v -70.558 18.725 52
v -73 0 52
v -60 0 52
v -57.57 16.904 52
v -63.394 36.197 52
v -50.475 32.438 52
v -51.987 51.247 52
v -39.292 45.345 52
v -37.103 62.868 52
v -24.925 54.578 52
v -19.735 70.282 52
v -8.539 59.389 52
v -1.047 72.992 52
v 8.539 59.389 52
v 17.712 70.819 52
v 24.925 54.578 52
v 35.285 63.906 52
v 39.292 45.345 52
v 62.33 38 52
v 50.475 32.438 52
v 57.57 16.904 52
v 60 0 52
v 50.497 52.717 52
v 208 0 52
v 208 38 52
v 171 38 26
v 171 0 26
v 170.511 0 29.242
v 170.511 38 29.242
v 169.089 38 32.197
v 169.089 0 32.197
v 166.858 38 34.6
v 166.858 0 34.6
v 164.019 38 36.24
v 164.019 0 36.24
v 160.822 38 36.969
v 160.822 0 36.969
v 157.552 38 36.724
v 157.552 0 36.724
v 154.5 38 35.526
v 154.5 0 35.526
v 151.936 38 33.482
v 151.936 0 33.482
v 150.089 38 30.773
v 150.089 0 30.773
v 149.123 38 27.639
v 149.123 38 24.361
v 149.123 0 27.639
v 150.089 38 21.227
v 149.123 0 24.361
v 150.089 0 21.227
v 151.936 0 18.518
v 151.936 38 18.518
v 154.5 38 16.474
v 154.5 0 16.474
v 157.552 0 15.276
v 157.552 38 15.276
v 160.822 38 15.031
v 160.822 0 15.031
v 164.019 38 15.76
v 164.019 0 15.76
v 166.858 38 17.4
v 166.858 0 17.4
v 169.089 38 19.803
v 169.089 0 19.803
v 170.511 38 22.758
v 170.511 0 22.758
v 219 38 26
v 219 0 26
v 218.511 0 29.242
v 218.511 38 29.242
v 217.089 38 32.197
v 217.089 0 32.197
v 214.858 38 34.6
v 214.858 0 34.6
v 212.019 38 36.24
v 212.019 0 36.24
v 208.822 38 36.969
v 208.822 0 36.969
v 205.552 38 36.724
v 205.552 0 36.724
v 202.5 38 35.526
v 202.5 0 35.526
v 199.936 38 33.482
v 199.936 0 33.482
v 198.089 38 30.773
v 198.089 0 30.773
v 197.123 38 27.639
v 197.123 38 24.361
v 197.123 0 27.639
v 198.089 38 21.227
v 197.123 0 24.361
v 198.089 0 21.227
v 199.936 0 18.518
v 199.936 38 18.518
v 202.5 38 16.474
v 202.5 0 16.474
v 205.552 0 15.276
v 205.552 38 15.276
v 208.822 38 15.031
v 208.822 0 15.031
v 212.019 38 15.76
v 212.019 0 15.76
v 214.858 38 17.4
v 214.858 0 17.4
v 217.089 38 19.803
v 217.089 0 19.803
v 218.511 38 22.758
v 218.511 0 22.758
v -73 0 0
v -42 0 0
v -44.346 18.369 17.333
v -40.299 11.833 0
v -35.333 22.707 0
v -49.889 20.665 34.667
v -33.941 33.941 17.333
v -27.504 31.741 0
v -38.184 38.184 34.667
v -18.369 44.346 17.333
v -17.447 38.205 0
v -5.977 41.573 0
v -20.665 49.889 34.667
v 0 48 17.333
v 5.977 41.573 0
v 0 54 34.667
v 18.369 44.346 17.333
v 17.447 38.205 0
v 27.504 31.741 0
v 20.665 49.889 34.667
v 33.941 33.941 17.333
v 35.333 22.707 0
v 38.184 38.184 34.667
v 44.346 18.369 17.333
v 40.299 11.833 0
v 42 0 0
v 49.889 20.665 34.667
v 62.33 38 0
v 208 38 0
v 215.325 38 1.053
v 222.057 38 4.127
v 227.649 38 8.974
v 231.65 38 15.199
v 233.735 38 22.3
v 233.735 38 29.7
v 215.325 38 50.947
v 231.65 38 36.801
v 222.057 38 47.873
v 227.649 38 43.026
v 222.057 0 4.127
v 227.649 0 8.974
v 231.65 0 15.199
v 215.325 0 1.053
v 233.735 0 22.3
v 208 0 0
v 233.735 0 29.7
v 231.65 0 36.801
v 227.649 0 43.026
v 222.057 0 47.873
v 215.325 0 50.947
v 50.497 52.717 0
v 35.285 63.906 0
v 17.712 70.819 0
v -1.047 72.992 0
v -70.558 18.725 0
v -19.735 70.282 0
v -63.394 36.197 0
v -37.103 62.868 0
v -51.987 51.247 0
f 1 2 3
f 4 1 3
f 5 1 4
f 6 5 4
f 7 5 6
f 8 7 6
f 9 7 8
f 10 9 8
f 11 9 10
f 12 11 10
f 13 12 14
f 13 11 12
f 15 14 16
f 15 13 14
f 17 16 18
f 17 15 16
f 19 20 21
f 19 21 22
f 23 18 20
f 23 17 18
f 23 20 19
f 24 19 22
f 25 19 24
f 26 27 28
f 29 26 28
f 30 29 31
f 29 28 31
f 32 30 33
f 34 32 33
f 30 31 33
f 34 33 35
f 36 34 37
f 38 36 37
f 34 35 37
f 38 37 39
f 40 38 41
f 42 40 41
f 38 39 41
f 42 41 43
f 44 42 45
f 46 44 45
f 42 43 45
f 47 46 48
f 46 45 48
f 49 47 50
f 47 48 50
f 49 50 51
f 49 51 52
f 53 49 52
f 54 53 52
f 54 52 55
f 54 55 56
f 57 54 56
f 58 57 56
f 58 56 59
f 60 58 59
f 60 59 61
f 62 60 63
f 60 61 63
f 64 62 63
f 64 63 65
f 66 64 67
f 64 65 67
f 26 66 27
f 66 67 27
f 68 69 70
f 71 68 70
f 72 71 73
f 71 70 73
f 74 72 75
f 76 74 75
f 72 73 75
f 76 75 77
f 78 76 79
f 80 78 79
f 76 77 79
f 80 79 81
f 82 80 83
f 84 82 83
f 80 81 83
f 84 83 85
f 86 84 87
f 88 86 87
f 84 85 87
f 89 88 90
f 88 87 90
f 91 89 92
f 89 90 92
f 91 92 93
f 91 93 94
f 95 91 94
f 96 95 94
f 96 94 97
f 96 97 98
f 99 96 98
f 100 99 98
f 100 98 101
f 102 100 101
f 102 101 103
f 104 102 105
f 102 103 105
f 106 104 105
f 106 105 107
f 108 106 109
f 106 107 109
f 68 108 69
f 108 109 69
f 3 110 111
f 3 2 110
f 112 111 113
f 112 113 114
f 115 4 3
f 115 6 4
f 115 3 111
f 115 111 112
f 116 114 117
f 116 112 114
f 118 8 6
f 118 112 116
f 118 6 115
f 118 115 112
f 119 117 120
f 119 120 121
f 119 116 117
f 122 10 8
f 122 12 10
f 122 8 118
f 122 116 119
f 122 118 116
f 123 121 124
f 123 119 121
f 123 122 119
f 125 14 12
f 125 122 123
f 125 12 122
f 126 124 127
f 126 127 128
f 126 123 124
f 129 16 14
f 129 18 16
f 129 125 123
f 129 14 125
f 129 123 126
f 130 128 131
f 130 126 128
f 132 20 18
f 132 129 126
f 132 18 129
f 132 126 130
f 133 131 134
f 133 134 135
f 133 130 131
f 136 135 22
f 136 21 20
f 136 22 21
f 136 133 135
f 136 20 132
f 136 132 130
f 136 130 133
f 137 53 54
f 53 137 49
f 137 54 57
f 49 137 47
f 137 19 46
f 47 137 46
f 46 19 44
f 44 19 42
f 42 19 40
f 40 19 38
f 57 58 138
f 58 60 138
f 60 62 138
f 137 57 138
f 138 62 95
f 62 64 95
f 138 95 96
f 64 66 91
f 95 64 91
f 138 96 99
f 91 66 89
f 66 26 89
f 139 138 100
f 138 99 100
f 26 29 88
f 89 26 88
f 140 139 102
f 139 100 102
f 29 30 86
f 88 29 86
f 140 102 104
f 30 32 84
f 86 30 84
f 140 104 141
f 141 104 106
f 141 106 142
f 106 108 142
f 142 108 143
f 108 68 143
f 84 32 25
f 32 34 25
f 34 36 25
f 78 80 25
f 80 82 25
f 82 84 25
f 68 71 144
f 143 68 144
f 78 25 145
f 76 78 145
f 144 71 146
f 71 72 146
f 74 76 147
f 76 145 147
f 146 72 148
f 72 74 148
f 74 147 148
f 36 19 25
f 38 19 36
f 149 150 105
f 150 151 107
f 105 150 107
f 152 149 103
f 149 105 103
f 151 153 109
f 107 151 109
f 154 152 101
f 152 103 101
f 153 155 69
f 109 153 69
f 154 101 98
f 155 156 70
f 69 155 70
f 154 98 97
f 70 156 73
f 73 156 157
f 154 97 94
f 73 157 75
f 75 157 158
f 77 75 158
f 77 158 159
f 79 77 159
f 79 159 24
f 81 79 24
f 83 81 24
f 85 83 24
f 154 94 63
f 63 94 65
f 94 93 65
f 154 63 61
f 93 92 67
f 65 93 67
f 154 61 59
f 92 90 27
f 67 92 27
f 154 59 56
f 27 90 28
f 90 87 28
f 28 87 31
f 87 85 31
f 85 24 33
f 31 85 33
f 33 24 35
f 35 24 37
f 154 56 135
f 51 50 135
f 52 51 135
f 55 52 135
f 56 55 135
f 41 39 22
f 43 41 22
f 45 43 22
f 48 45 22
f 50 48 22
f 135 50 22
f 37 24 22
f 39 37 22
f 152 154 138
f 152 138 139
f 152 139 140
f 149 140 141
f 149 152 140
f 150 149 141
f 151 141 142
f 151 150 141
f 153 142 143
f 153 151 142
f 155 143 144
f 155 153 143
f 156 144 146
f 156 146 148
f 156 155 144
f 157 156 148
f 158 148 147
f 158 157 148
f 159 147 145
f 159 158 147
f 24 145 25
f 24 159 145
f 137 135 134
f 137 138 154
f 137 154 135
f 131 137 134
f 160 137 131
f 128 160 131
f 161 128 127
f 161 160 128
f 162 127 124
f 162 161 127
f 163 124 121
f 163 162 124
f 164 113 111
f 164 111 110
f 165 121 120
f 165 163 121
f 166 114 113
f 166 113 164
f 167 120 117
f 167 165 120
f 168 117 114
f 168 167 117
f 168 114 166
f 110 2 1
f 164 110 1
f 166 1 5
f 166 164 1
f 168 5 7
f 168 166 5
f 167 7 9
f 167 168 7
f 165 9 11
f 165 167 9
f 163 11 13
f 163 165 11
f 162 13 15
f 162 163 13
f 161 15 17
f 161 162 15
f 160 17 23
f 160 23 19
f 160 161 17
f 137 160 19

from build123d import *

# Parameters (mm, degrees)
F1_ANGLE = 180
F2_R     = 11
F3_DEPTH = 38


with BuildPart() as f1:
    # F0 (on Front) → F1 (revolve)
    with BuildSketch(Plane.XZ):
        Polygon((-73, 0), (-42, 0), (-60, 52), (-73, 52), align=None)
    revolve(axis=Axis((0, 0, 26.369863), (0, 0, -1)), revolution_arc=F1_ANGLE)

    # F2 (on Front) → F3 (join)
    with BuildSketch(Plane.XZ):
        with BuildLine():
            Line((60, 52), (60, 0))
            Line((60, 0), (208, 0))
            ThreePointArc((208, 0), (234, 26), (208, 52))
            Line((208, 52), (73, 52))
            Line((73, 52), (60, 52))
        make_face()
        with Locations((160, 26)):
            Circle(F2_R, mode=Mode.SUBTRACT)
        with Locations((208, 26)):
            Circle(F2_R, mode=Mode.SUBTRACT)
    extrude(amount=-F3_DEPTH)


solid = f1.part
